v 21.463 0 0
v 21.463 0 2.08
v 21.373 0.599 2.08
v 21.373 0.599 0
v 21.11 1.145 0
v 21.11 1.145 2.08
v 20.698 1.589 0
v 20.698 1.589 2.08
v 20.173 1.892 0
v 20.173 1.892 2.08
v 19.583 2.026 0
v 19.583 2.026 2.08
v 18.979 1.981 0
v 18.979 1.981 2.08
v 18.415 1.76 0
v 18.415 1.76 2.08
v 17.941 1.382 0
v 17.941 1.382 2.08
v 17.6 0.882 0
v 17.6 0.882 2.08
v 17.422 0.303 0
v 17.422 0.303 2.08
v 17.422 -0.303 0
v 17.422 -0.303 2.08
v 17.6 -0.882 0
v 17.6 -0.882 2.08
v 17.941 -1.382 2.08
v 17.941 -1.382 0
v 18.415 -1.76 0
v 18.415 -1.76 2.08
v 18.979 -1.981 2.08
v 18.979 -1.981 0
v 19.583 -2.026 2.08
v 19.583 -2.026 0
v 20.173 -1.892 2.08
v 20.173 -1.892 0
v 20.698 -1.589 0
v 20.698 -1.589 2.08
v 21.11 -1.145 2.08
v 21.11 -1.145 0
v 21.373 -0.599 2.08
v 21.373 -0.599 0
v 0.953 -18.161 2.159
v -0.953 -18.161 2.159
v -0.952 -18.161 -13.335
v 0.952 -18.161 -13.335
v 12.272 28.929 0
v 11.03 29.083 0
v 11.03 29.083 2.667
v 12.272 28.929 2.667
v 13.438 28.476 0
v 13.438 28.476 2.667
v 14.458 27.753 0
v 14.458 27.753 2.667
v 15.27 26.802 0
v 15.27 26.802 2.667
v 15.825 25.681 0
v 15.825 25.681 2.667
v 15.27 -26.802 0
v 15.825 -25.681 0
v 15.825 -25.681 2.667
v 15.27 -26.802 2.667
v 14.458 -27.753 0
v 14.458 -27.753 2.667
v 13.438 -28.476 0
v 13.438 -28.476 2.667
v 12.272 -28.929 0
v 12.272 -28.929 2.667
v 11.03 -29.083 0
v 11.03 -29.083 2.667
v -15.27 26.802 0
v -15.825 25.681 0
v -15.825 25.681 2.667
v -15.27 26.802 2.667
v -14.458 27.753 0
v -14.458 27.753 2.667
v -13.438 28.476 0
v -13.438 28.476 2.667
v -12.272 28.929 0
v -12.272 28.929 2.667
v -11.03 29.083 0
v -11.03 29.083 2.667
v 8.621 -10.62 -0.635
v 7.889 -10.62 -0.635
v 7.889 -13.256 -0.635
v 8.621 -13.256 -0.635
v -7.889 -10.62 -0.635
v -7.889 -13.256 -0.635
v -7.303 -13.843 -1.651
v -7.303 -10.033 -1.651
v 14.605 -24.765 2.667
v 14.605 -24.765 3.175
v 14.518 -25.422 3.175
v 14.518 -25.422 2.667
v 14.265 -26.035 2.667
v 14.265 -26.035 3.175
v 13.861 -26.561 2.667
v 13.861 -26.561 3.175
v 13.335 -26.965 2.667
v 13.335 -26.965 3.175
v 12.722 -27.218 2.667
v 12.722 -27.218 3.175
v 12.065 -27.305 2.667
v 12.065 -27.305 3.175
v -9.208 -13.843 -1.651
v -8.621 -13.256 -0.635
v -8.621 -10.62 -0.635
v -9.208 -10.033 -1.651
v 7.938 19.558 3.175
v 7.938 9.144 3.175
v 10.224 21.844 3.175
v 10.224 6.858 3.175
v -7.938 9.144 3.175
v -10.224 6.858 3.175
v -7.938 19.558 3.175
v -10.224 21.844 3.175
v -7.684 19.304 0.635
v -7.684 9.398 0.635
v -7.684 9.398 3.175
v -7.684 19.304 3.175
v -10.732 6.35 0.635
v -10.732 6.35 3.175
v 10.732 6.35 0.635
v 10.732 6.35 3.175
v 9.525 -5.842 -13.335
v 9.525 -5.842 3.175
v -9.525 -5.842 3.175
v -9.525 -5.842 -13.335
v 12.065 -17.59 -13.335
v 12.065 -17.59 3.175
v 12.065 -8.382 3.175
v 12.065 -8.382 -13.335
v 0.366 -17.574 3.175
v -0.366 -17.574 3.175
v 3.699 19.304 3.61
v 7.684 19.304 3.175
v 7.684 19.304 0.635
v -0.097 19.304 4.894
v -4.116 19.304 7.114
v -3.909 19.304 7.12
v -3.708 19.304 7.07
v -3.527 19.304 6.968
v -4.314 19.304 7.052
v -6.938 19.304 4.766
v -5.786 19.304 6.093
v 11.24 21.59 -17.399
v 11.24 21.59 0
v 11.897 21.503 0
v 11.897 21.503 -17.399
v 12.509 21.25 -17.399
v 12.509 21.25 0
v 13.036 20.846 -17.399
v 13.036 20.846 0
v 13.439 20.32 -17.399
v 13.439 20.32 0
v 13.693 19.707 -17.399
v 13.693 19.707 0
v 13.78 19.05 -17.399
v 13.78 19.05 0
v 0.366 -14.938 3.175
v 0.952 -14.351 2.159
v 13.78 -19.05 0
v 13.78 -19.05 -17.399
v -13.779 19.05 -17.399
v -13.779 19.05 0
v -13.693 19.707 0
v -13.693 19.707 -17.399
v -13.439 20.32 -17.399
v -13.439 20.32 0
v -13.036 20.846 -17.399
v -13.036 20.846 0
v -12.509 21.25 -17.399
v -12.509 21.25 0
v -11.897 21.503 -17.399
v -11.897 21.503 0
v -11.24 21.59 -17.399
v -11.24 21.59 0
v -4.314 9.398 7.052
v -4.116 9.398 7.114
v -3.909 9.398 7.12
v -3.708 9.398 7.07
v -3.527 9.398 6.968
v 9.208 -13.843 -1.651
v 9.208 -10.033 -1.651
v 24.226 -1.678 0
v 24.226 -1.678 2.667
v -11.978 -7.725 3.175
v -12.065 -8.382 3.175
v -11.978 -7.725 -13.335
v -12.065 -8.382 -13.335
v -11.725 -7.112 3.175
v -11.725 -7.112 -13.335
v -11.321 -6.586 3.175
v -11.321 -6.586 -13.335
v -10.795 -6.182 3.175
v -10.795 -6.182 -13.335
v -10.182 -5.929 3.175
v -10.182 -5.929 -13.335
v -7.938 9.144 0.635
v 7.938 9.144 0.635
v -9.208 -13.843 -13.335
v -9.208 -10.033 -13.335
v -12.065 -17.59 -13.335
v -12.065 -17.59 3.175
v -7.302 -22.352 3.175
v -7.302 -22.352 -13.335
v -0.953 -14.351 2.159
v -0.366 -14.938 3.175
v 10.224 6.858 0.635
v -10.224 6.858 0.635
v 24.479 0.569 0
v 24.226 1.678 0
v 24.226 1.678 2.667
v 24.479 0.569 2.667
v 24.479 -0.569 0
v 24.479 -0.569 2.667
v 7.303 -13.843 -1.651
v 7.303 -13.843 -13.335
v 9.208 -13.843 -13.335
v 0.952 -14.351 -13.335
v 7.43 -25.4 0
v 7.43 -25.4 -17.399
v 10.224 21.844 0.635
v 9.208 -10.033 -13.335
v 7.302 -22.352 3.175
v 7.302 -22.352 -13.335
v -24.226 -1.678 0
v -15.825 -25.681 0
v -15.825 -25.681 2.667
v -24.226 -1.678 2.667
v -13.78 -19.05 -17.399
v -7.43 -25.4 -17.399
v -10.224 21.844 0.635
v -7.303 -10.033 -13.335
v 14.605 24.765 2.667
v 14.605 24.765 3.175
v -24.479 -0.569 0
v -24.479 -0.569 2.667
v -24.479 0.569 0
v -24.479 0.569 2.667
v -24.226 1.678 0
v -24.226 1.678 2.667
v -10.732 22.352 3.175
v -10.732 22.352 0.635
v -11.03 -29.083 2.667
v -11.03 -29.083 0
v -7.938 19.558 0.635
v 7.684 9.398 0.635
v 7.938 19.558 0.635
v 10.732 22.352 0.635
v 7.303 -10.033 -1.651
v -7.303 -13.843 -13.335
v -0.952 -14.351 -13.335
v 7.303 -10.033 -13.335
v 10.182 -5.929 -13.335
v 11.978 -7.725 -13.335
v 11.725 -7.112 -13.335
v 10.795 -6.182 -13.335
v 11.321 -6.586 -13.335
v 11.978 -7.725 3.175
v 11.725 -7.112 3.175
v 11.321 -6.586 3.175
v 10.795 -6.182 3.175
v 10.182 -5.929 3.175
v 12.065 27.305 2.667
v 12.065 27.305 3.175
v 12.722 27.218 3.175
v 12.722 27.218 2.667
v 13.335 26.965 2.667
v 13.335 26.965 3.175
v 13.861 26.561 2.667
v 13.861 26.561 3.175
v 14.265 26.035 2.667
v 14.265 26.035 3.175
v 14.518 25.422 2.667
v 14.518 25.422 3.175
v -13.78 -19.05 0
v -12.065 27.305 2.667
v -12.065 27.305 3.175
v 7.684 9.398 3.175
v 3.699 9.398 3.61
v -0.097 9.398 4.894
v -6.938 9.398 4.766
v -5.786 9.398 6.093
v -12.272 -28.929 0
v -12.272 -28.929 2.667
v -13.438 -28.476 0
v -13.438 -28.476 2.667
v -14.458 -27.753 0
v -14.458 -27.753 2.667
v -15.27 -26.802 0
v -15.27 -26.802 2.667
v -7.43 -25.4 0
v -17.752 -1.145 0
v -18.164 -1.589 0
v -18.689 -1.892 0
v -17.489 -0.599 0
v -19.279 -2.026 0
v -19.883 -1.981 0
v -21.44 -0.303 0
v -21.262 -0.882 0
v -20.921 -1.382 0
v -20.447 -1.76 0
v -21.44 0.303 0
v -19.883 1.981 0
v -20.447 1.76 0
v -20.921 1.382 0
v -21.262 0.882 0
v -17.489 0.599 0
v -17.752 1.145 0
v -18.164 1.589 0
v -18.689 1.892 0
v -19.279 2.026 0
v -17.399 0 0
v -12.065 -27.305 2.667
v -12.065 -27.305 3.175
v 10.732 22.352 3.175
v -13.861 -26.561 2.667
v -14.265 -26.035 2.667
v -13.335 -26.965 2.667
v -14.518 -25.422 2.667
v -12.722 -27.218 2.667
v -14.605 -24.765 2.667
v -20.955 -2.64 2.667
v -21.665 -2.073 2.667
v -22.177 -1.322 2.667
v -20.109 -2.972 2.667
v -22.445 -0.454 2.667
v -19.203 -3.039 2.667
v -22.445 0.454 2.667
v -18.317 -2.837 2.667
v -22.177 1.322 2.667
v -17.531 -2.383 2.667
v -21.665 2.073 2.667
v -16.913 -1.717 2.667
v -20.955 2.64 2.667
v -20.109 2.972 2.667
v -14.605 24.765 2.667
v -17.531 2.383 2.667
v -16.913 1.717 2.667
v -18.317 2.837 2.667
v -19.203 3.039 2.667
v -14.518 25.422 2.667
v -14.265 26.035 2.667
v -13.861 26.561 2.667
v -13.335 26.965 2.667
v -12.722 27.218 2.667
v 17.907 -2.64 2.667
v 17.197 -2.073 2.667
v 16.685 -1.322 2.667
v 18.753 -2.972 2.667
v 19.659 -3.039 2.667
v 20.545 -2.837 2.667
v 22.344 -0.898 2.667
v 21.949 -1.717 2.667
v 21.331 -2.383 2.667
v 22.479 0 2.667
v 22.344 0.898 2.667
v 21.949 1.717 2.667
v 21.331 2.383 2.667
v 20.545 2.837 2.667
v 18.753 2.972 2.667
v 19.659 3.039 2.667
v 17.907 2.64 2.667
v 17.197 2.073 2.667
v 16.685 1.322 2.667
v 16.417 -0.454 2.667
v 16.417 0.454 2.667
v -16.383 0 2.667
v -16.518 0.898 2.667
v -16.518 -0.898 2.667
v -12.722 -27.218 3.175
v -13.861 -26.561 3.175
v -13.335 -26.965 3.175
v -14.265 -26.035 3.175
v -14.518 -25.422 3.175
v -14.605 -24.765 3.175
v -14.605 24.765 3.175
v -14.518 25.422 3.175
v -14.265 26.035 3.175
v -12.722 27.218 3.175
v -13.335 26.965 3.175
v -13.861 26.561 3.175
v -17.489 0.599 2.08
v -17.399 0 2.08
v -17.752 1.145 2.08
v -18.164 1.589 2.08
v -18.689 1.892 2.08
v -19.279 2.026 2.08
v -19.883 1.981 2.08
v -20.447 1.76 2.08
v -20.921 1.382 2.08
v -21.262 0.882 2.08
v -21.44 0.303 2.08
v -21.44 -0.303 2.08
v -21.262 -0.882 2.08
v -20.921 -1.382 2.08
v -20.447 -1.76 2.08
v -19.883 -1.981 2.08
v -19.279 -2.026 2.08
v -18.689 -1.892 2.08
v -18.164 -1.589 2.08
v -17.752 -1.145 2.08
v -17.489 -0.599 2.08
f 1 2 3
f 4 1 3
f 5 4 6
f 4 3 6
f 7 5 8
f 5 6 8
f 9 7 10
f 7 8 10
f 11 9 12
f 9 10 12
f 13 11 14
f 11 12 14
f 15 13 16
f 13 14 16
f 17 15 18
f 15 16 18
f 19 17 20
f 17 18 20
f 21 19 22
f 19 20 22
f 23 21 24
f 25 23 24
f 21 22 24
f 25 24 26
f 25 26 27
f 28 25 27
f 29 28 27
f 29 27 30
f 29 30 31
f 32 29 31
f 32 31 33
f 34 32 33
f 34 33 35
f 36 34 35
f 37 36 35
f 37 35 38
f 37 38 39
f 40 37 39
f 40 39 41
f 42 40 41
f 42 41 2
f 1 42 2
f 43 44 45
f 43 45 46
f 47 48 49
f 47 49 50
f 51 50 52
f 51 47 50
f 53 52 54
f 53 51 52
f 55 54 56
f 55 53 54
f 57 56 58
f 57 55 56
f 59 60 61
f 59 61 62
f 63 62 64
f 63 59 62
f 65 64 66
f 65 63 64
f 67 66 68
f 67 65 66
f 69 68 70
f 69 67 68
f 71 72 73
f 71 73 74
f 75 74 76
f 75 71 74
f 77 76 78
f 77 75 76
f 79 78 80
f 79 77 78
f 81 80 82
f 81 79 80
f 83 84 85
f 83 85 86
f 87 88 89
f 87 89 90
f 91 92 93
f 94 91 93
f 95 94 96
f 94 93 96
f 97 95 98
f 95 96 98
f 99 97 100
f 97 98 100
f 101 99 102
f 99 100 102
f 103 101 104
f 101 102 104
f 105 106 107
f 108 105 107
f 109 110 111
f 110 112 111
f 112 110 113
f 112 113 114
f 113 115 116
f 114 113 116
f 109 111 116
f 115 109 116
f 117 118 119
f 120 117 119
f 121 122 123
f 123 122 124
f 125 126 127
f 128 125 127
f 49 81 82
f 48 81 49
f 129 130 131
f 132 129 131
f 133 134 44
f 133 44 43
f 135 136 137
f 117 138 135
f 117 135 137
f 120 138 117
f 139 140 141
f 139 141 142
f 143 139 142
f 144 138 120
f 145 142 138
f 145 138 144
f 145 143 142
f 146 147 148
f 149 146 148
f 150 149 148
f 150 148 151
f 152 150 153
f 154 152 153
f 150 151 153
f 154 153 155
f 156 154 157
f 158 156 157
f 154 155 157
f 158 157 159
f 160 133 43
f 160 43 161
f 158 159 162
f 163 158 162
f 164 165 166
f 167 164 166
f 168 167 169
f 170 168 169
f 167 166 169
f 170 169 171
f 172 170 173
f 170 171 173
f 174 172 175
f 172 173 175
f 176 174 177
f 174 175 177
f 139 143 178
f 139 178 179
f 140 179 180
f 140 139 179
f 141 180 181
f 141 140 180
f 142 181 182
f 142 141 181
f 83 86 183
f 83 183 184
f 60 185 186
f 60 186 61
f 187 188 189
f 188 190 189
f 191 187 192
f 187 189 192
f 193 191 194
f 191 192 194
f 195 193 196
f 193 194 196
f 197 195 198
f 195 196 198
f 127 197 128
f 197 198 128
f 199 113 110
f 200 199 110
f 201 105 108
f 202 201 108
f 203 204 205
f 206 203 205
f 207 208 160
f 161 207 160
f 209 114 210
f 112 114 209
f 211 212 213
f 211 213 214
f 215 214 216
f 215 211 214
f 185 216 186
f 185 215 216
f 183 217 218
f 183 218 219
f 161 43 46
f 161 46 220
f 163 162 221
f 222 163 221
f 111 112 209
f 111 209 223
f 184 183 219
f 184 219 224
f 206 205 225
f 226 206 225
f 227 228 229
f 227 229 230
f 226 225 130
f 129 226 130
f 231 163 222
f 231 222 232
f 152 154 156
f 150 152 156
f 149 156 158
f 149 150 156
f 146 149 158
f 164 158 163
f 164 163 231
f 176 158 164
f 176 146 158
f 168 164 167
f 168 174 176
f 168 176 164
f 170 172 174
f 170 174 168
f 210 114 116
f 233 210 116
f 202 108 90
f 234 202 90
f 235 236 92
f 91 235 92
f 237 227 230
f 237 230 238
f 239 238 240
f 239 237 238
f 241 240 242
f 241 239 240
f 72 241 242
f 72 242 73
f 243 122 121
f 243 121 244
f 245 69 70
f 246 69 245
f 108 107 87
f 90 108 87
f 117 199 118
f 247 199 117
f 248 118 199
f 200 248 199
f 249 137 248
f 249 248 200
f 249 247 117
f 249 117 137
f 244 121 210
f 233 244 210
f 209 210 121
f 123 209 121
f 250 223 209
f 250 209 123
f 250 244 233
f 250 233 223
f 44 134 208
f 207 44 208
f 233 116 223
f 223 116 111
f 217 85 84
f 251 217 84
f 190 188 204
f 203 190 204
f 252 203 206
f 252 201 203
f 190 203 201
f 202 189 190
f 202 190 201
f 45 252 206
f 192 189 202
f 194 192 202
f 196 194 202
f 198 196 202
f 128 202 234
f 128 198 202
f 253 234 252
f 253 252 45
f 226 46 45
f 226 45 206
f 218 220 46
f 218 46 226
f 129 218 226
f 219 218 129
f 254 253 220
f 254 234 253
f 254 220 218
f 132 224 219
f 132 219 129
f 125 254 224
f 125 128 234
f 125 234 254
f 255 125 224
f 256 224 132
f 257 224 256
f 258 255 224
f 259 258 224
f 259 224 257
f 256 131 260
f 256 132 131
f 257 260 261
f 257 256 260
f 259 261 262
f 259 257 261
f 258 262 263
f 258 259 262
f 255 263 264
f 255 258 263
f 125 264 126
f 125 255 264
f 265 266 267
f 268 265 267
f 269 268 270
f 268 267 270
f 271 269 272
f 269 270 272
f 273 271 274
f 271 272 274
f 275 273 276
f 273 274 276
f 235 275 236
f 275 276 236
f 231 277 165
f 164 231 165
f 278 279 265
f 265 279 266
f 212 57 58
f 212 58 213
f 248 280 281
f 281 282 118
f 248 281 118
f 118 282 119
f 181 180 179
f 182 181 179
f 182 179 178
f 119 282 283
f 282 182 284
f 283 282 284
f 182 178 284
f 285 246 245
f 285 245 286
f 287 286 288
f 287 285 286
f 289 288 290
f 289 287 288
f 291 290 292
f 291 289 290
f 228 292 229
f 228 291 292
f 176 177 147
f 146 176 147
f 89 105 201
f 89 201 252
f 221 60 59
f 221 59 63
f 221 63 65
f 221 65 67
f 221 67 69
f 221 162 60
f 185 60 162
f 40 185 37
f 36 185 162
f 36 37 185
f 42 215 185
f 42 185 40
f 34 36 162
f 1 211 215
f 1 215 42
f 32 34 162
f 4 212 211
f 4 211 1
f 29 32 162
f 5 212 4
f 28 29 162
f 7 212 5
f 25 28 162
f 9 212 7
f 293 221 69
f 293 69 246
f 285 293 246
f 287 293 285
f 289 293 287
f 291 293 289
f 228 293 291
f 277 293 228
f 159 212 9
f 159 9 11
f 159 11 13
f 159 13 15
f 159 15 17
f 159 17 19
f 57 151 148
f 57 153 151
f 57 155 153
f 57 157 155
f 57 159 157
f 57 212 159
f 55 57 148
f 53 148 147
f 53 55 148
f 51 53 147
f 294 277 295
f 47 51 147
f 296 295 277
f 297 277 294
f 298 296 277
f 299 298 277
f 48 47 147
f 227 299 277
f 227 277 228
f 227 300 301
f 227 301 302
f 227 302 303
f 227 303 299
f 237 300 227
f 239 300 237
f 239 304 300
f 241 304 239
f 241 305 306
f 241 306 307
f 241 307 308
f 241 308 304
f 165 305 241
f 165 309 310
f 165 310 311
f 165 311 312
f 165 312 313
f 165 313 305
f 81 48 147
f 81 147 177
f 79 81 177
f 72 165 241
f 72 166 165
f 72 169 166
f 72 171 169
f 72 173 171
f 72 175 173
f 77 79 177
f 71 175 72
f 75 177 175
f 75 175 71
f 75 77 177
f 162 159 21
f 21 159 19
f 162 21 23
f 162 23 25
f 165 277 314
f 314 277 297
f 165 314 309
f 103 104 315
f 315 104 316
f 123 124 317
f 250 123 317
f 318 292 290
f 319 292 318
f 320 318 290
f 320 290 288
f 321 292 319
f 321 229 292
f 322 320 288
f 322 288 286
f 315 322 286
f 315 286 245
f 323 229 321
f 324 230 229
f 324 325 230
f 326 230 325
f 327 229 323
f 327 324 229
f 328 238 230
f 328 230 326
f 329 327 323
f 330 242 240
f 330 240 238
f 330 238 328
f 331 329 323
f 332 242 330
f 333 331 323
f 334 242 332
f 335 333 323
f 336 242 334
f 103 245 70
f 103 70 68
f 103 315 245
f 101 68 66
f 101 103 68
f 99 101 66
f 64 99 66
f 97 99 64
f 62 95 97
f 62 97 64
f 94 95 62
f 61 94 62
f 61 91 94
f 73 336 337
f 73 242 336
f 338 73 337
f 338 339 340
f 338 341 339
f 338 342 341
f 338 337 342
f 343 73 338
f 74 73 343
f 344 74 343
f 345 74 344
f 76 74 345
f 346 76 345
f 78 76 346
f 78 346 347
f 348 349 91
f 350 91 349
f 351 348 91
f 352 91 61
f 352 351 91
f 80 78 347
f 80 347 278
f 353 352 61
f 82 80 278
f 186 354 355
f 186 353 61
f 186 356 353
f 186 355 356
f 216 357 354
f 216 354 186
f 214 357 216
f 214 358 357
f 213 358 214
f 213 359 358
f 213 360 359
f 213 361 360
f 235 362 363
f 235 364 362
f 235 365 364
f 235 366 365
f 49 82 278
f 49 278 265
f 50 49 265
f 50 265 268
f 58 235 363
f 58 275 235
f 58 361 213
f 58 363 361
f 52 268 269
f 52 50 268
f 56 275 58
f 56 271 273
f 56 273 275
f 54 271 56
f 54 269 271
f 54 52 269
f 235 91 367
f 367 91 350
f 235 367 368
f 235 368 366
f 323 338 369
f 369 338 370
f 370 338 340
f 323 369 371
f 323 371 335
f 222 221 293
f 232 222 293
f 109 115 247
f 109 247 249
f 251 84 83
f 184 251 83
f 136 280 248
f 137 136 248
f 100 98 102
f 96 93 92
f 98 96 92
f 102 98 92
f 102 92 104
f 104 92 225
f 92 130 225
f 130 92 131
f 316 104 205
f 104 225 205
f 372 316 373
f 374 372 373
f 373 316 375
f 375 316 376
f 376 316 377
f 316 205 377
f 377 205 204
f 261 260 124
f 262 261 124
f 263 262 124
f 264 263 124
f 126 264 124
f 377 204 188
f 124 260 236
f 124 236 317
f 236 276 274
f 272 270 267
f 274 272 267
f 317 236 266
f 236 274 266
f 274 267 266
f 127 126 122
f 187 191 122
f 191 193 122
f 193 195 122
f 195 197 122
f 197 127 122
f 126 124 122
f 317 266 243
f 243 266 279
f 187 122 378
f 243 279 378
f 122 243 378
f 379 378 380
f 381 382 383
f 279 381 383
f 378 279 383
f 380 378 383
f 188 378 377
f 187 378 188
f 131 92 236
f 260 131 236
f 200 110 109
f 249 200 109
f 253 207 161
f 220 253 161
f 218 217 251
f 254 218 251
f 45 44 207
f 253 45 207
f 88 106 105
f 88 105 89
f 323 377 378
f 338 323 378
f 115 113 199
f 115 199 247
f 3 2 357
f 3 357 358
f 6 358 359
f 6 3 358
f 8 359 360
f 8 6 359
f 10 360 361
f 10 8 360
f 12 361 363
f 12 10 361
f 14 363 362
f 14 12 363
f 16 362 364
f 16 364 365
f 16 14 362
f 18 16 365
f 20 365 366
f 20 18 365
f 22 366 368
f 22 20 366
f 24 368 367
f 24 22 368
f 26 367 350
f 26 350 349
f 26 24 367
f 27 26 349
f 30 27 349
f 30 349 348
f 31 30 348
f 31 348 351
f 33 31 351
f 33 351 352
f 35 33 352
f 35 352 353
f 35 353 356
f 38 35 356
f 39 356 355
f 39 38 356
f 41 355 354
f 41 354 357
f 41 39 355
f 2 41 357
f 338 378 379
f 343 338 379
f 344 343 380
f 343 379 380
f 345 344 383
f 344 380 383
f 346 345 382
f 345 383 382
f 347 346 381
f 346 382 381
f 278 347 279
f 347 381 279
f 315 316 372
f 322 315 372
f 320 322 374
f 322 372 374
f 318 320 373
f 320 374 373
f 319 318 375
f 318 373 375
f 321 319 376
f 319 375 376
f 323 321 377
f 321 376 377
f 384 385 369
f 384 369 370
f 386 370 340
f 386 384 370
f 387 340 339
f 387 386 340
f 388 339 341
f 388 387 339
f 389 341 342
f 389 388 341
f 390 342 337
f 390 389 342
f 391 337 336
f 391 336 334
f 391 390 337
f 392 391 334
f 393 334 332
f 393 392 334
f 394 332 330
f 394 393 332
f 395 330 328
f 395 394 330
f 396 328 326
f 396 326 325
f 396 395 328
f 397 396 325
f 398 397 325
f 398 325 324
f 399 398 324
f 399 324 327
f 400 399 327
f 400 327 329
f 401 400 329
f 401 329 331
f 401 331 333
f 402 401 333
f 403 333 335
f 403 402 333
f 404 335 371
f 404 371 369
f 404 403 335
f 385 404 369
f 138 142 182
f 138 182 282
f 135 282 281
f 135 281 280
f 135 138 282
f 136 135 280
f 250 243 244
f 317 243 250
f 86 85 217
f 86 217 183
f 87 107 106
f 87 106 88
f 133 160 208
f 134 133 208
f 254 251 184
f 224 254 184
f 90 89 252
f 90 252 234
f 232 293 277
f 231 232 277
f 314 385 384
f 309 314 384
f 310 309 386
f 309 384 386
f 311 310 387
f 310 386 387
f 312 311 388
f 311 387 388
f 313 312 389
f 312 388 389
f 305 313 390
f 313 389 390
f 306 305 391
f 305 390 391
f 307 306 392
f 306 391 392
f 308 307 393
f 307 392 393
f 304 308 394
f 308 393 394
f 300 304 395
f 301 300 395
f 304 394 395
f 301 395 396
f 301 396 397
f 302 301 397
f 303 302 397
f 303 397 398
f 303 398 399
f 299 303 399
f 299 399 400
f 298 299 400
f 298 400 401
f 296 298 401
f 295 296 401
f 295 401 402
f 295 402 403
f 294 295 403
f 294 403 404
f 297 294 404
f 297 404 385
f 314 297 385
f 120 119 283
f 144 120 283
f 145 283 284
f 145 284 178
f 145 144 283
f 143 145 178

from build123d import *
from OCP.BRepFilletAPI import BRepFilletAPI_MakeChamfer

# Parameters (mm, degrees)
BOSS_EXTRUDE1_DEPTH = 3.175
CUT_EXTRUDE1_DEPTH  = 0.508
SKETCH3_W           = 21.463
SKETCH3_H           = 16.002
SKETCH3_W_2         = 20.447
SKETCH3_H_2         = 14.986
SKETCH3_W_3         = 15.875
SKETCH3_H_3         = 10.414
CUT_EXTRUDE2_DEPTH  = 2.54
BOSS_EXTRUDE3_DEPTH = 9.906
BOSS_EXTRUDE4_DEPTH = 17.399
SKETCH7_W           = 1.905
SKETCH7_H           = 3.81
CUT_EXTRUDE3_DEPTH  = 16.51
SKETCH8_W           = 1.905
SKETCH8_H           = 3.81
CUT_EXTRUDE4_DEPTH  = 3.81
CHAMFER1_SIZE       = 1.016
CHAMFER1_SIZE2      = 0.586587873
FILLET1_R           = 2.54
SKETCH9_R           = 2.032
CUT_EXTRUDE5_DEPTH  = 44.002957642
CHAMFER2_SIZE       = 1.016
CHAMFER2_SIZE2      = 0.586587873


with BuildPart() as part:
    # Sketch1 → Boss-Extrude1 (new body)
    with BuildSketch(Plane.XY):
        with BuildLine():
            Line((-11.03046671, 29.083), (11.03046671, 29.083))
            ThreePointArc((11.03046671, 29.083), (13.97, 28.146132153), (15.825299343, 25.681088204))
            Line((15.825299343, 25.681088204), (24.225832633, 1.678088204))
            ThreePointArc((24.225832633, 1.678088204), (24.511, 0), (24.225832633, -1.678088204))
            Line((24.225832633, -1.678088204), (15.825299343, -25.681088204))
            ThreePointArc((15.825299343, -25.681088204), (13.97, -28.146132153), (11.03046671, -29.083))
            Line((11.03046671, -29.083), (-11.03046671, -29.083))
            ThreePointArc((-11.03046671, -29.083), (-13.97, -28.146132153), (-15.825299343, -25.681088204))
            Line((-15.825299343, -25.681088204), (-24.225832633, -1.678088204))
            ThreePointArc((-24.225832633, -1.678088204), (-24.511, 0), (-24.225832633, 1.678088204))
            Line((-24.225832633, 1.678088204), (-15.825299343, 25.681088204))
            ThreePointArc((-15.825299343, 25.681088204), (-13.97, 28.146132153), (-11.03046671, 29.083))
        make_face()
    extrude(amount=BOSS_EXTRUDE1_DEPTH)

    # Sketch2 → Cut-Extrude1 (cut)
    with BuildSketch(Plane.XY.offset(3.175)):
        with BuildLine():
            Line((-11.03046671, -29.083), (11.03046671, -29.083))
            ThreePointArc((11.03046671, -29.083), (13.97, -28.146132153), (15.825299343, -25.681088204))
            Line((15.825299343, -25.681088204), (24.225832633, -1.678088204))
            ThreePointArc((24.225832633, -1.678088204), (24.511, 0), (24.225832633, 1.678088204))
            Line((24.225832633, 1.678088204), (15.825299343, 25.681088204))
            ThreePointArc((15.825299343, 25.681088204), (13.97, 28.146132153), (11.03046671, 29.083))
            Line((11.03046671, 29.083), (-11.03046671, 29.083))
            ThreePointArc((-11.03046671, 29.083), (-13.97, 28.146132153), (-15.825299343, 25.681088204))
            Line((-15.825299343, 25.681088204), (-24.225832633, 1.678088204))
            ThreePointArc((-24.225832633, 1.678088204), (-24.511, 0), (-24.225832633, -1.678088204))
            Line((-24.225832633, -1.678088204), (-15.825299343, -25.681088204))
            ThreePointArc((-15.825299343, -25.681088204), (-13.97, -28.146132153), (-11.03046671, -29.083))
        make_face()
        with BuildLine():
            Line((-12.065, 27.305), (12.065, 27.305))
            ThreePointArc((12.065, 27.305), (13.861051224, 26.561051224), (14.605, 24.765))
            Line((14.605, 24.765), (14.605, -24.765))
            ThreePointArc((14.605, -24.765), (13.861051224, -26.561051224), (12.065, -27.305))
            Line((12.065, -27.305), (-12.065, -27.305))
            ThreePointArc((-12.065, -27.305), (-13.861051224, -26.561051224), (-14.605, -24.765))
            Line((-14.605, -24.765), (-14.605, 24.765))
            ThreePointArc((-14.605, 24.765), (-13.861051224, 26.561051224), (-12.065, 27.305))
        make_face(mode=Mode.SUBTRACT)
    extrude(amount=-CUT_EXTRUDE1_DEPTH, mode=Mode.SUBTRACT)

    # Sketch3 → Cut-Extrude2 (cut)
    with BuildSketch(Plane.XY.offset(3.175)):
        with Locations((0, 14.351)):
            Rectangle(SKETCH3_W, SKETCH3_H)
        with Locations((0, 14.351)):
            Rectangle(SKETCH3_W_2, SKETCH3_H_2, mode=Mode.SUBTRACT)
        with Locations((0, 14.351)):
            Rectangle(SKETCH3_W_3, SKETCH3_H_3)
    extrude(amount=-CUT_EXTRUDE2_DEPTH, mode=Mode.SUBTRACT)

    # Sketch5 → Boss-Extrude3 (add)
    with BuildSketch(Plane.XZ.offset(-19.304)):
        with BuildLine():
            Line((-7.6835, 0.635), (-7.6835, 3.175))
            ThreePointArc((-7.6835, 3.175), (-6.408209158, 5.469554889), (-4.313795397, 7.052204524))
            ThreePointArc((-4.313795397, 7.052204524), (-3.908770324, 7.120088215), (-3.527334844, 6.967902539))
            ThreePointArc((-3.527334844, 6.967902539), (1.765964035, 4.148909918), (7.6835, 3.175))
            Line((7.6835, 3.175), (7.6835, 0.635))
            Line((7.6835, 0.635), (-7.6835, 0.635))
        make_face()
    extrude(amount=BOSS_EXTRUDE3_DEPTH)

    # Sketch6 → Boss-Extrude4 (add)
    with BuildSketch(Plane(origin=(0, 0, 0), x_dir=(-1, 0, 0), z_dir=(0, 0, -1))):
        with BuildLine():
            Line((-13.7795, -19.05), (-7.4295, -25.4))
            Line((-7.4295, -25.4), (7.4295, -25.4))
            Line((7.4295, -25.4), (13.7795, -19.05))
            Line((13.7795, -19.05), (13.7795, 19.05))
            ThreePointArc((13.7795, 19.05), (13.035551224, 20.846051224), (11.2395, 21.59))
            Line((11.2395, 21.59), (-11.2395, 21.59))
            ThreePointArc((-11.2395, 21.59), (-13.035551224, 20.846051224), (-13.7795, 19.05))
            Line((-13.7795, 19.05), (-13.7795, -19.05))
        make_face()
    extrude(amount=BOSS_EXTRUDE4_DEPTH)

    # Sketch7 → Cut-Extrude3 (cut)
    with BuildSketch(Plane.XY.offset(3.175)):
        Polygon((-7.3025, -22.352), (7.3025, -22.352), (12.065, -17.5895), (12.065, -5.842), (-12.065, -5.842), (-12.065, -17.5895), align=None)
        with Locations((-8.255, -11.938)):
            Rectangle(SKETCH7_W, SKETCH7_H, mode=Mode.SUBTRACT)
        with Locations((0, -16.256)):
            Rectangle(SKETCH7_W, SKETCH7_H, mode=Mode.SUBTRACT)
        with Locations((8.255, -11.938)):
            Rectangle(SKETCH7_W, SKETCH7_H, mode=Mode.SUBTRACT)
    extrude(amount=-CUT_EXTRUDE3_DEPTH, mode=Mode.SUBTRACT)

    # Sketch8 → Cut-Extrude4 (cut)
    with BuildSketch(Plane.XY.offset(3.175)):
        with Locations((8.255, -11.938)):
            Rectangle(SKETCH8_W, SKETCH8_H)
        with Locations((-8.255, -11.938)):
            Rectangle(SKETCH8_W, SKETCH8_H)
    extrude(amount=-CUT_EXTRUDE4_DEPTH, mode=Mode.SUBTRACT)

    # Chamfer1: one chamfer whose edges measure the first distance from different faces: ONE call of the kernel's chamfer builder (chamfer() names one face for all edges)
    chamfer1_edges_1 = [part.edges().sort_by_distance(p)[0] for p in [
        (-0.9525, -16.256, 3.175),
    ]]
    chamfer1_side_1 = [part.faces().sort_by_distance(p)[0] for p in [
        (-0.9525, -16.256, -5.08),
    ]]
    chamfer1_edges_2 = [part.edges().sort_by_distance(p)[0] for p in [
        (0, -14.351, 3.175),
    ]]
    chamfer1_side_2 = [part.faces().sort_by_distance(p)[0] for p in [
        (0, -14.351, -5.08),
    ]]
    chamfer1_edges_3 = [part.edges().sort_by_distance(p)[0] for p in [
        (0.9525, -16.256, 3.175),
    ]]
    chamfer1_side_3 = [part.faces().sort_by_distance(p)[0] for p in [
        (0.9525, -16.256, -5.08),
    ]]
    chamfer1_edges_4 = [part.edges().sort_by_distance(p)[0] for p in [
        (0, -18.161, 3.175),
    ]]
    chamfer1_side_4 = [part.faces().sort_by_distance(p)[0] for p in [
        (0, -18.161, -5.08),
    ]]
    chamfer1_edges_5 = [part.edges().sort_by_distance(p)[0] for p in [
        (8.255, -10.033, -0.635),
    ]]
    chamfer1_side_5 = [part.faces().sort_by_distance(p)[0] for p in [
        (8.255, -10.033, -6.985),
    ]]
    chamfer1_edges_6 = [part.edges().sort_by_distance(p)[0] for p in [
        (9.2075, -11.938, -0.635),
    ]]
    chamfer1_side_6 = [part.faces().sort_by_distance(p)[0] for p in [
        (9.2075, -11.938, -6.985),
    ]]
    chamfer1_edges_7 = [part.edges().sort_by_distance(p)[0] for p in [
        (8.255, -13.843, -0.635),
    ]]
    chamfer1_side_7 = [part.faces().sort_by_distance(p)[0] for p in [
        (8.255, -13.843, -6.985),
    ]]
    chamfer1_edges_8 = [part.edges().sort_by_distance(p)[0] for p in [
        (7.3025, -11.938, -0.635),
    ]]
    chamfer1_side_8 = [part.faces().sort_by_distance(p)[0] for p in [
        (7.3025, -11.938, -6.985),
    ]]
    chamfer1_edges_9 = [part.edges().sort_by_distance(p)[0] for p in [
        (-8.255, -10.033, -0.635),
    ]]
    chamfer1_side_9 = [part.faces().sort_by_distance(p)[0] for p in [
        (-8.255, -10.033, -6.985),
    ]]
    chamfer1_edges_10 = [part.edges().sort_by_distance(p)[0] for p in [
        (-7.3025, -11.938, -0.635),
    ]]
    chamfer1_side_10 = [part.faces().sort_by_distance(p)[0] for p in [
        (-7.3025, -11.938, -6.985),
    ]]
    chamfer1_edges_11 = [part.edges().sort_by_distance(p)[0] for p in [
        (-8.255, -13.843, -0.635),
    ]]
    chamfer1_side_11 = [part.faces().sort_by_distance(p)[0] for p in [
        (-8.255, -13.843, -6.985),
    ]]
    chamfer1_edges_12 = [part.edges().sort_by_distance(p)[0] for p in [
        (-9.2075, -11.938, -0.635),
    ]]
    chamfer1_side_12 = [part.faces().sort_by_distance(p)[0] for p in [
        (-9.2075, -11.938, -6.985),
    ]]
    chamfer1 = BRepFilletAPI_MakeChamfer(part.part.solid().wrapped)
    for e in chamfer1_edges_1:
        chamfer1.Add(CHAMFER1_SIZE, CHAMFER1_SIZE2, e.wrapped, chamfer1_side_1[0].wrapped)  # the first distance lies on this face
    for e in chamfer1_edges_2:
        chamfer1.Add(CHAMFER1_SIZE, CHAMFER1_SIZE2, e.wrapped, chamfer1_side_2[0].wrapped)  # the first distance lies on this face
    for e in chamfer1_edges_3:
        chamfer1.Add(CHAMFER1_SIZE, CHAMFER1_SIZE2, e.wrapped, chamfer1_side_3[0].wrapped)  # the first distance lies on this face
    for e in chamfer1_edges_4:
        chamfer1.Add(CHAMFER1_SIZE, CHAMFER1_SIZE2, e.wrapped, chamfer1_side_4[0].wrapped)  # the first distance lies on this face
    for e in chamfer1_edges_5:
        chamfer1.Add(CHAMFER1_SIZE, CHAMFER1_SIZE2, e.wrapped, chamfer1_side_5[0].wrapped)  # the first distance lies on this face
    for e in chamfer1_edges_6:
        chamfer1.Add(CHAMFER1_SIZE, CHAMFER1_SIZE2, e.wrapped, chamfer1_side_6[0].wrapped)  # the first distance lies on this face
    for e in chamfer1_edges_7:
        chamfer1.Add(CHAMFER1_SIZE, CHAMFER1_SIZE2, e.wrapped, chamfer1_side_7[0].wrapped)  # the first distance lies on this face
    for e in chamfer1_edges_8:
        chamfer1.Add(CHAMFER1_SIZE, CHAMFER1_SIZE2, e.wrapped, chamfer1_side_8[0].wrapped)  # the first distance lies on this face
    for e in chamfer1_edges_9:
        chamfer1.Add(CHAMFER1_SIZE, CHAMFER1_SIZE2, e.wrapped, chamfer1_side_9[0].wrapped)  # the first distance lies on this face
    for e in chamfer1_edges_10:
        chamfer1.Add(CHAMFER1_SIZE, CHAMFER1_SIZE2, e.wrapped, chamfer1_side_10[0].wrapped)  # the first distance lies on this face
    for e in chamfer1_edges_11:
        chamfer1.Add(CHAMFER1_SIZE, CHAMFER1_SIZE2, e.wrapped, chamfer1_side_11[0].wrapped)  # the first distance lies on this face
    for e in chamfer1_edges_12:
        chamfer1.Add(CHAMFER1_SIZE, CHAMFER1_SIZE2, e.wrapped, chamfer1_side_12[0].wrapped)  # the first distance lies on this face
    add(Compound.cast(chamfer1.Shape()), mode=Mode.REPLACE)

    # Fillet1
    fillet1_edges = [part.edges().sort_by_distance(p)[0] for p in [
        (-12.065, -5.842, -5.08),
        (12.065, -5.842, -5.08),
    ]]
    fillet(fillet1_edges, radius=FILLET1_R)

    # Sketch9 → Cut-Extrude5 (cut, through all)
    with BuildSketch(Plane.XY.offset(2.667)):
        with Locations((-19.431, 0)):
            Circle(SKETCH9_R)
        with Locations((19.431, 0)):
            Circle(SKETCH9_R)
    extrude(amount=-CUT_EXTRUDE5_DEPTH, mode=Mode.SUBTRACT)

    # Chamfer2
    chamfer2_edges = [part.edges().sort_by_distance(p)[0] for p in [
        (-21.463, 0, 2.667),
        (17.399, 0, 2.667),
    ]]
    chamfer2_side = [part.faces().sort_by_distance(p)[0] for p in [
        (-23.750313465, 0, 2.667),
    ]]
    chamfer(chamfer2_edges, length=CHAMFER2_SIZE, length2=CHAMFER2_SIZE2, reference=chamfer2_side[0])


solid = part.part
